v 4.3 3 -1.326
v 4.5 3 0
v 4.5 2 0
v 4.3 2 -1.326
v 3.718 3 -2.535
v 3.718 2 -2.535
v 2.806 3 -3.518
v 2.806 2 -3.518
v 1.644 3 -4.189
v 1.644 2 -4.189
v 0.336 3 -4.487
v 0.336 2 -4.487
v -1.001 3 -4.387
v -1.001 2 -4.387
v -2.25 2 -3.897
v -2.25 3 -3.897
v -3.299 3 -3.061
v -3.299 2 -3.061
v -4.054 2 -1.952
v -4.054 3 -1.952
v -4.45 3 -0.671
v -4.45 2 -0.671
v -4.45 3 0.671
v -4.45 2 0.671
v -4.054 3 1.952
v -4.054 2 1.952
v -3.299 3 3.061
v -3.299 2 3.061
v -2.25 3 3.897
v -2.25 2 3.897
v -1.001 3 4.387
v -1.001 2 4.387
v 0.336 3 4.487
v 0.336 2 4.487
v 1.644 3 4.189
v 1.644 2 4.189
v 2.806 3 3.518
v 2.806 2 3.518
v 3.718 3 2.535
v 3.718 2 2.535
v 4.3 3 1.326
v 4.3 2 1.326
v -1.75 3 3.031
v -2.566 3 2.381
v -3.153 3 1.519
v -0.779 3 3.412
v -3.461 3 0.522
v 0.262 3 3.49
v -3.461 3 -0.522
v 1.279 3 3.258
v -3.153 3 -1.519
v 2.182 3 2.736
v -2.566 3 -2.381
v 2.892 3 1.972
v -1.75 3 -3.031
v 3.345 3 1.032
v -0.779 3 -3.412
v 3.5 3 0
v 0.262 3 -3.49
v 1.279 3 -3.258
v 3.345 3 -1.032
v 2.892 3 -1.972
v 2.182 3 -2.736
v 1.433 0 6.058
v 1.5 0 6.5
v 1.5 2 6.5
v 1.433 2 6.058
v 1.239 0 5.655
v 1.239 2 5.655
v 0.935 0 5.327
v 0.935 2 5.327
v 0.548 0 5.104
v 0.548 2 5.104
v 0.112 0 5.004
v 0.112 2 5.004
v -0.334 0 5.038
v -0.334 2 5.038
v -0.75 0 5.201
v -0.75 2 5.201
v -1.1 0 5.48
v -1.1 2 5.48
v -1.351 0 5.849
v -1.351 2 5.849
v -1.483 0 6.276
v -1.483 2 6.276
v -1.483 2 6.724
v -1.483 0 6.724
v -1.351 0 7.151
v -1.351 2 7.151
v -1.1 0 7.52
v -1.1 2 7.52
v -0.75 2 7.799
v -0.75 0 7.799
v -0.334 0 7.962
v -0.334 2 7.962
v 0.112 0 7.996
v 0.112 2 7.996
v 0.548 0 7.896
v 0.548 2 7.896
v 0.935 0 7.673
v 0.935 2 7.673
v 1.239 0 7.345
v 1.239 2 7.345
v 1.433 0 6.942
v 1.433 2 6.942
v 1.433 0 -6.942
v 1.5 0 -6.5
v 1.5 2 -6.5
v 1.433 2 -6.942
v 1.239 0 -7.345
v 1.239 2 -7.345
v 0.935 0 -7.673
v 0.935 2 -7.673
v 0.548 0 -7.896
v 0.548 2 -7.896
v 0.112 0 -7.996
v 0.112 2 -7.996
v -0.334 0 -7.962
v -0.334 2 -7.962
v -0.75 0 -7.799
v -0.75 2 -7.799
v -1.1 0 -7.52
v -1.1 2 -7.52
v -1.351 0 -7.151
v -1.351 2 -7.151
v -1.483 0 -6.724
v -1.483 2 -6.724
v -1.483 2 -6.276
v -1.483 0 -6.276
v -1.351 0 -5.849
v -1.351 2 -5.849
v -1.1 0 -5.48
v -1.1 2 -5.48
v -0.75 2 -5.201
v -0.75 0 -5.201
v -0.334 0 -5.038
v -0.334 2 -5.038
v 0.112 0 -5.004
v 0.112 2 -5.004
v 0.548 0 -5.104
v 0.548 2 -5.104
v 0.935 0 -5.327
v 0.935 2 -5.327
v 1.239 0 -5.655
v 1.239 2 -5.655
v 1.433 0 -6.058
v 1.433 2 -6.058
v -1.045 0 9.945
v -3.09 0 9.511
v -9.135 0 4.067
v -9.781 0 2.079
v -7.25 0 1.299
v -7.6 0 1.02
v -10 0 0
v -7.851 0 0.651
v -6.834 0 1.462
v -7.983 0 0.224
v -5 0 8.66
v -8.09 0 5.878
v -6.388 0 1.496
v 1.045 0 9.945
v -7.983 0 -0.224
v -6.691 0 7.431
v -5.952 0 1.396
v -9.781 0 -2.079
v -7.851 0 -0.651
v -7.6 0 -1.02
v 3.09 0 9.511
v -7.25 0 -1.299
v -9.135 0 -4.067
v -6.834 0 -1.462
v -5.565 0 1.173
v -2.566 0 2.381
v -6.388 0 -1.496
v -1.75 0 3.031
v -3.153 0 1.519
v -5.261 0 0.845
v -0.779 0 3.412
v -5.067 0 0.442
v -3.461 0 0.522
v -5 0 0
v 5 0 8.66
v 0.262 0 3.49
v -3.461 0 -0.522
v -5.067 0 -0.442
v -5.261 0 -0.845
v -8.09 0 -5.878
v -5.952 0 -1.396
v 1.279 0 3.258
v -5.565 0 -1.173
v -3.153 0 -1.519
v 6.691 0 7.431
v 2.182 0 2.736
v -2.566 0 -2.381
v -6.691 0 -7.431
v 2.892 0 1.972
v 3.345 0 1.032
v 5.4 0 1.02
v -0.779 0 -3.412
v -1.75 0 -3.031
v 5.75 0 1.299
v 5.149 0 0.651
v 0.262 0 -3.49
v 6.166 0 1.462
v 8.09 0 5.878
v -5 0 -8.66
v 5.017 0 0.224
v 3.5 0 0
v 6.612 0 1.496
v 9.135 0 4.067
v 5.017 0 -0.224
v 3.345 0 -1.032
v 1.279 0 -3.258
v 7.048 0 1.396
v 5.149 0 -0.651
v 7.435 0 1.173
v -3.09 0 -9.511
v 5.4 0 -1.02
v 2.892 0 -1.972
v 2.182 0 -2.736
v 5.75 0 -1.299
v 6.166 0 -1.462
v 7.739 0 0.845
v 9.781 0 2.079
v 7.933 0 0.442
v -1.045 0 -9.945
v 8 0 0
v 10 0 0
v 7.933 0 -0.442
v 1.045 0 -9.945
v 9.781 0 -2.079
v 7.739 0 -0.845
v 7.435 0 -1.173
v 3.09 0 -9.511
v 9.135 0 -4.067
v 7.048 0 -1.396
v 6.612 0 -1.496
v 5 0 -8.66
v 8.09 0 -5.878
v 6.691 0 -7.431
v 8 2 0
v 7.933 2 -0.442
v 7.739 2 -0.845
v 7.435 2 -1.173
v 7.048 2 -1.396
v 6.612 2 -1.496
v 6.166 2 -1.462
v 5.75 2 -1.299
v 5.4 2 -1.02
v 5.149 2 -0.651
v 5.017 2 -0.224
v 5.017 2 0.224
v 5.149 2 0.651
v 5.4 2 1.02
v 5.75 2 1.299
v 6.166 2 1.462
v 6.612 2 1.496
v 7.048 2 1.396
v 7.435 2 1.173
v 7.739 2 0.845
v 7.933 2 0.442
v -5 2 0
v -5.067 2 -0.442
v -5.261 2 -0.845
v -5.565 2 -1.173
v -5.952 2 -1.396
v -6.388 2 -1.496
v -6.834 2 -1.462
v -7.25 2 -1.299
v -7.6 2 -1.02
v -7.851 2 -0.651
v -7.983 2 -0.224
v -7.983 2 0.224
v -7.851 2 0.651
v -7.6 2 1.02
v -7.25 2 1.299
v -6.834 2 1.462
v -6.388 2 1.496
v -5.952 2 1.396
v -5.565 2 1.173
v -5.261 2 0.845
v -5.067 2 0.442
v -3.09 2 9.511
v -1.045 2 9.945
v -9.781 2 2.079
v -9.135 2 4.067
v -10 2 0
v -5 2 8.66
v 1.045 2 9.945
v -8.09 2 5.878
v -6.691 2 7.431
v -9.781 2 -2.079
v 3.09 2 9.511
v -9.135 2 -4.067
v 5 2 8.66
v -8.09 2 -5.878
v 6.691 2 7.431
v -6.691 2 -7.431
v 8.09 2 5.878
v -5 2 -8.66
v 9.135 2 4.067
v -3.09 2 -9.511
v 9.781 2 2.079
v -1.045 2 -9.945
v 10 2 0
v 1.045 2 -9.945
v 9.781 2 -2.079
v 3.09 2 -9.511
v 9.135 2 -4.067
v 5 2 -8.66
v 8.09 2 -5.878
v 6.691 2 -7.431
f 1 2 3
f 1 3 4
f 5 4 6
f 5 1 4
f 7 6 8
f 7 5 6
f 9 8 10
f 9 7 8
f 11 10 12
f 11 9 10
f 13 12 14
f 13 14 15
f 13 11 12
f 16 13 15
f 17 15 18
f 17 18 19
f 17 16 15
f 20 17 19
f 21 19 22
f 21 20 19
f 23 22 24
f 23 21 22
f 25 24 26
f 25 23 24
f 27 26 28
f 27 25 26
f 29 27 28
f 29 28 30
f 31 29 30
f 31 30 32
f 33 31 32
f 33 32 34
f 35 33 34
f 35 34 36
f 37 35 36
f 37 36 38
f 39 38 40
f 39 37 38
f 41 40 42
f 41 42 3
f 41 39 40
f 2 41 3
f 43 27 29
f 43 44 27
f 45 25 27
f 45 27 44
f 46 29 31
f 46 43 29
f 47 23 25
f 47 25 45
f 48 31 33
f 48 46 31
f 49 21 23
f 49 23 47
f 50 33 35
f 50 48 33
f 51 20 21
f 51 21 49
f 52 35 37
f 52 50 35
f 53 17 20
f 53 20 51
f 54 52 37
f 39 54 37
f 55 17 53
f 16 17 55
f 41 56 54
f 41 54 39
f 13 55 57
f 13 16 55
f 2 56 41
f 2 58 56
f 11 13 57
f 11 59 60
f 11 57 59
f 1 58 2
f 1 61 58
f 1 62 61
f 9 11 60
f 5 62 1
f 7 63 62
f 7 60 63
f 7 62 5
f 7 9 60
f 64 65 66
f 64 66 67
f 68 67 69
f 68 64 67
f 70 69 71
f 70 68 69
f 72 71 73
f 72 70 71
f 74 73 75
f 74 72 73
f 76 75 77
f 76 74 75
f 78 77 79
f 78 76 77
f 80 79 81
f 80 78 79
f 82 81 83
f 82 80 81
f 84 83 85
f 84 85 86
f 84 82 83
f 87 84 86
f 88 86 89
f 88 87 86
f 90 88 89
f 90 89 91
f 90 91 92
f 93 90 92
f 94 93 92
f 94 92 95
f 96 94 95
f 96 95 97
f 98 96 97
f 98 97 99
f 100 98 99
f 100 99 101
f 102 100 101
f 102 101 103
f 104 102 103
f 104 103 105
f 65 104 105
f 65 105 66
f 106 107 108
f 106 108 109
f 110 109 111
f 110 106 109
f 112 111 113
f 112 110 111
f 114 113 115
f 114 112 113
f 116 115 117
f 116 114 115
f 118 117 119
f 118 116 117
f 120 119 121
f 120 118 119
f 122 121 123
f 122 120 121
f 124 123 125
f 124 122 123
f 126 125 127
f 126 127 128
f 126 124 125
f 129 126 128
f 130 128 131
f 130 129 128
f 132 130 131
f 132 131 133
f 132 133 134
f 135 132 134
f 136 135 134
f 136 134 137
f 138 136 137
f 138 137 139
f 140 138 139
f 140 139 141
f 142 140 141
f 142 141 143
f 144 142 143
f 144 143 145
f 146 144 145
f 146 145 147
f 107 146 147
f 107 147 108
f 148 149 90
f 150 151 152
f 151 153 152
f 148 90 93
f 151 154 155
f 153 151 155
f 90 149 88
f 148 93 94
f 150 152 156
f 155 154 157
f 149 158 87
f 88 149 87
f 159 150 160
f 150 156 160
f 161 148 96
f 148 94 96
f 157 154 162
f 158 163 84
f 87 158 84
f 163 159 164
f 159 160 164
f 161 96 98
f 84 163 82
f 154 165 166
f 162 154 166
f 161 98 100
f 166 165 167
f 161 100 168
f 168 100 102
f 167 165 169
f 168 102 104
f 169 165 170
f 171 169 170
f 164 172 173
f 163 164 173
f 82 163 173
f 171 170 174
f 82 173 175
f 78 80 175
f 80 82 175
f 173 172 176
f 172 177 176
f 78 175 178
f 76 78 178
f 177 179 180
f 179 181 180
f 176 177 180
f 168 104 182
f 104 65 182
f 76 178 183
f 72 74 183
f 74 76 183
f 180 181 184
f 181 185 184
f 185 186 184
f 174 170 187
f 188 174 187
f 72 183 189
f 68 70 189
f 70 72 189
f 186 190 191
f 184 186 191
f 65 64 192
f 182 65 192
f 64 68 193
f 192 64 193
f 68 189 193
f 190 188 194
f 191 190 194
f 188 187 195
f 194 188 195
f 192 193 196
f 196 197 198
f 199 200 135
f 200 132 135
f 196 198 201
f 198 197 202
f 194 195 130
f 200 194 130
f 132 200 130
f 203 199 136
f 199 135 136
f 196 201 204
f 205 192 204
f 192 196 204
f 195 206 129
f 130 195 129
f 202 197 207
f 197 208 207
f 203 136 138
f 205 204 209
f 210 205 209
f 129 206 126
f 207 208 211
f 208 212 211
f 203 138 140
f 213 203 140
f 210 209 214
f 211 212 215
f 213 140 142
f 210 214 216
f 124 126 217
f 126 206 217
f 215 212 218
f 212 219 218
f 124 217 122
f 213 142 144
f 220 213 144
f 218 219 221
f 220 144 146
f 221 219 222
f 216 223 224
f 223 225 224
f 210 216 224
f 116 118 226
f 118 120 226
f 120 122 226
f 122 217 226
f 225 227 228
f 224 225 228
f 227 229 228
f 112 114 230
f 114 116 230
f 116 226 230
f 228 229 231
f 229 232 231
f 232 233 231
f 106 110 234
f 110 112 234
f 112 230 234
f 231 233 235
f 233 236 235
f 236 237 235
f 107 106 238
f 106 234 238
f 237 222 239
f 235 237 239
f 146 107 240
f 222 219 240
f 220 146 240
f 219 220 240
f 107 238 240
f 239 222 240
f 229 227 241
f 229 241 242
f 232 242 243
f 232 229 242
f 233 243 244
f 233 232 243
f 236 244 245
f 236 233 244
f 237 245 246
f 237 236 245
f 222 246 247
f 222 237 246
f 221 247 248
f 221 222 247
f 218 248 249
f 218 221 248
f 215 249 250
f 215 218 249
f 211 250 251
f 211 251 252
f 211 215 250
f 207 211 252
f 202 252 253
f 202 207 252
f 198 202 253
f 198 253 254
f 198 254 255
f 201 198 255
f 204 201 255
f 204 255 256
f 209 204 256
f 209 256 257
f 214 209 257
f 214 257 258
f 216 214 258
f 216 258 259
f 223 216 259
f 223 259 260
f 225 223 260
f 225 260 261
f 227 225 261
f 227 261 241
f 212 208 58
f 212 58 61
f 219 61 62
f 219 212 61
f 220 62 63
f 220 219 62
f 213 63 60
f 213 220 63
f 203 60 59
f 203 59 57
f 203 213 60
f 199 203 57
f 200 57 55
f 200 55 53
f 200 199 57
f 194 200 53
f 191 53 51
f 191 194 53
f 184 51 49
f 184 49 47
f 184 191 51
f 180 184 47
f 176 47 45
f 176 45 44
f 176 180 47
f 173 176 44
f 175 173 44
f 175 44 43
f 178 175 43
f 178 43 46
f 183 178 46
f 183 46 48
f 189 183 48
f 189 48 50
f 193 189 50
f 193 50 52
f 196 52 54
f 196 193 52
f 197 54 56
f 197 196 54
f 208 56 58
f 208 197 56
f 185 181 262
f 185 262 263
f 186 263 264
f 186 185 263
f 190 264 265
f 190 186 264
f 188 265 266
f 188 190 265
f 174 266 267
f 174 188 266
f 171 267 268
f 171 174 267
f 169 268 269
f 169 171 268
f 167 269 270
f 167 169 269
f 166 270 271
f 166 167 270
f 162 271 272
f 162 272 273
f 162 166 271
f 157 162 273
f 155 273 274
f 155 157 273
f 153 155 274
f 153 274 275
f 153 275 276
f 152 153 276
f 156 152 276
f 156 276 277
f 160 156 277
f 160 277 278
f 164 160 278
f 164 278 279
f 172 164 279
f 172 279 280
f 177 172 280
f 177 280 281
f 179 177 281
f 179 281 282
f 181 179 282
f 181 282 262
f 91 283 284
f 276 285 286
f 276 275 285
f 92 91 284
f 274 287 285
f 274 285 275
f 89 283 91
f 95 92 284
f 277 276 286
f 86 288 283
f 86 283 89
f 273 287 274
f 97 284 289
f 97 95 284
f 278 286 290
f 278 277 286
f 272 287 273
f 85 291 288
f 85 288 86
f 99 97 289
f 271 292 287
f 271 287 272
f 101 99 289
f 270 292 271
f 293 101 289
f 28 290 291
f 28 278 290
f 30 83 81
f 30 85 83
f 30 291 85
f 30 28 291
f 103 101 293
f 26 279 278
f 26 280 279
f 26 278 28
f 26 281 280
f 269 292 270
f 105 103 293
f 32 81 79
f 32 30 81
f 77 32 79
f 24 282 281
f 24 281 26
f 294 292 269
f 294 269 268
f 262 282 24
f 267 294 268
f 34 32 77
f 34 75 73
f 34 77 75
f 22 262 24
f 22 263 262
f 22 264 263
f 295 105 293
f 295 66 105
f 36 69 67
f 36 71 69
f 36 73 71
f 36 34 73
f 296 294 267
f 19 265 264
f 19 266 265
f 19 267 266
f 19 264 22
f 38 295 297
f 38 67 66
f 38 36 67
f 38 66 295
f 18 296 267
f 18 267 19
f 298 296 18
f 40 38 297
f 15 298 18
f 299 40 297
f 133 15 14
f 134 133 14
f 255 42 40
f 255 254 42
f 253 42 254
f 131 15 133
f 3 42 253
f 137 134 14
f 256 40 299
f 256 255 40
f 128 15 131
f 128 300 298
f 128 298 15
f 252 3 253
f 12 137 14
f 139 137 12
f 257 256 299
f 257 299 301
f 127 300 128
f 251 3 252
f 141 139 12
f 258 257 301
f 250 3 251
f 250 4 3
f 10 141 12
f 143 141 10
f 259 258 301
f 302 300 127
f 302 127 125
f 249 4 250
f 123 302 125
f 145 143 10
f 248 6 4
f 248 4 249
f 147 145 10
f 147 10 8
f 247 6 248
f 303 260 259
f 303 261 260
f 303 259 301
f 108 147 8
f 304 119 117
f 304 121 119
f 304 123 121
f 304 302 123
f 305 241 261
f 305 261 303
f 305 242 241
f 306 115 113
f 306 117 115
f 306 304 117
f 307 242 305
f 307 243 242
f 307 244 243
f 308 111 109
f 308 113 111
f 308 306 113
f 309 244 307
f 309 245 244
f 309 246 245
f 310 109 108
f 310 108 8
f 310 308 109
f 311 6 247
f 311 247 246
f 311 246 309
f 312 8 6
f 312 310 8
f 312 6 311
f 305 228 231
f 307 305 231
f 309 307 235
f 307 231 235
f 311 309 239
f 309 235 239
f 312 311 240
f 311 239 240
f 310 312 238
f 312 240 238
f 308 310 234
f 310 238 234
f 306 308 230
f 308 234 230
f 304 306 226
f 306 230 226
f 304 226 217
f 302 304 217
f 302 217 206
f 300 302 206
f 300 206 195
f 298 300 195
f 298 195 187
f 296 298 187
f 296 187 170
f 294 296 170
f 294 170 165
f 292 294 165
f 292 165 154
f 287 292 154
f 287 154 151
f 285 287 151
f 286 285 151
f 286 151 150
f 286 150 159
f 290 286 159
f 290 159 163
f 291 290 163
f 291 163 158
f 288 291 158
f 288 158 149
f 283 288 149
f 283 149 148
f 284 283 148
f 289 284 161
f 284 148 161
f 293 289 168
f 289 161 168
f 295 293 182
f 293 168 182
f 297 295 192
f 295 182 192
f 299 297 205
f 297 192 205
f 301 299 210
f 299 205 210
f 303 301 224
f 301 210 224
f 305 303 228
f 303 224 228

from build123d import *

# Parameters (mm, degrees)
SKETCH_1_R          = 10
SKETCH_1_R_2        = 3.5
SKETCH_1_R_3        = 1.5
EXTRUDE_1_DEPTH     = 3
SKETCH_2_R          = 10
SKETCH_2_R_2        = 4.5
SKETCH_2_R_3        = 1.5
CUT_EXTRUDE_1_DEPTH = 1


with BuildPart() as part:
    # 草图1 → 凸台-拉伸1 (new body)
    with BuildSketch(Plane(origin=(0, 0, 0), x_dir=(1, 0, 0), z_dir=(0, 1, 0))):
        Circle(SKETCH_1_R)
        Circle(SKETCH_1_R_2, mode=Mode.SUBTRACT)
        with Locations((0, 6.5)):
            Circle(SKETCH_1_R_3, mode=Mode.SUBTRACT)
        with Locations((0, -6.5)):
            Circle(SKETCH_1_R_3, mode=Mode.SUBTRACT)
        with Locations((-6.5, 0)):
            Circle(SKETCH_1_R_3, mode=Mode.SUBTRACT)
        with Locations((6.5, 0)):
            Circle(SKETCH_1_R_3, mode=Mode.SUBTRACT)
    extrude(amount=EXTRUDE_1_DEPTH)

    # 草图2 → 切除-拉伸1 (cut)
    with BuildSketch(Plane(origin=(0, 3, 0), x_dir=(1, 0, 0), z_dir=(0, 1, 0))):
        Circle(SKETCH_2_R)
        Circle(SKETCH_2_R_2, mode=Mode.SUBTRACT)
        with Locations((0, -6.5)):
            Circle(SKETCH_2_R_3, mode=Mode.SUBTRACT)
        with Locations((0, 6.5)):
            Circle(SKETCH_2_R_3, mode=Mode.SUBTRACT)
        with Locations((6.5, 0)):
            Circle(SKETCH_2_R_3, mode=Mode.SUBTRACT)
        with Locations((-6.5, 0)):
            Circle(SKETCH_2_R_3, mode=Mode.SUBTRACT)
    extrude(amount=-CUT_EXTRUDE_1_DEPTH, mode=Mode.SUBTRACT)


solid = part.part
